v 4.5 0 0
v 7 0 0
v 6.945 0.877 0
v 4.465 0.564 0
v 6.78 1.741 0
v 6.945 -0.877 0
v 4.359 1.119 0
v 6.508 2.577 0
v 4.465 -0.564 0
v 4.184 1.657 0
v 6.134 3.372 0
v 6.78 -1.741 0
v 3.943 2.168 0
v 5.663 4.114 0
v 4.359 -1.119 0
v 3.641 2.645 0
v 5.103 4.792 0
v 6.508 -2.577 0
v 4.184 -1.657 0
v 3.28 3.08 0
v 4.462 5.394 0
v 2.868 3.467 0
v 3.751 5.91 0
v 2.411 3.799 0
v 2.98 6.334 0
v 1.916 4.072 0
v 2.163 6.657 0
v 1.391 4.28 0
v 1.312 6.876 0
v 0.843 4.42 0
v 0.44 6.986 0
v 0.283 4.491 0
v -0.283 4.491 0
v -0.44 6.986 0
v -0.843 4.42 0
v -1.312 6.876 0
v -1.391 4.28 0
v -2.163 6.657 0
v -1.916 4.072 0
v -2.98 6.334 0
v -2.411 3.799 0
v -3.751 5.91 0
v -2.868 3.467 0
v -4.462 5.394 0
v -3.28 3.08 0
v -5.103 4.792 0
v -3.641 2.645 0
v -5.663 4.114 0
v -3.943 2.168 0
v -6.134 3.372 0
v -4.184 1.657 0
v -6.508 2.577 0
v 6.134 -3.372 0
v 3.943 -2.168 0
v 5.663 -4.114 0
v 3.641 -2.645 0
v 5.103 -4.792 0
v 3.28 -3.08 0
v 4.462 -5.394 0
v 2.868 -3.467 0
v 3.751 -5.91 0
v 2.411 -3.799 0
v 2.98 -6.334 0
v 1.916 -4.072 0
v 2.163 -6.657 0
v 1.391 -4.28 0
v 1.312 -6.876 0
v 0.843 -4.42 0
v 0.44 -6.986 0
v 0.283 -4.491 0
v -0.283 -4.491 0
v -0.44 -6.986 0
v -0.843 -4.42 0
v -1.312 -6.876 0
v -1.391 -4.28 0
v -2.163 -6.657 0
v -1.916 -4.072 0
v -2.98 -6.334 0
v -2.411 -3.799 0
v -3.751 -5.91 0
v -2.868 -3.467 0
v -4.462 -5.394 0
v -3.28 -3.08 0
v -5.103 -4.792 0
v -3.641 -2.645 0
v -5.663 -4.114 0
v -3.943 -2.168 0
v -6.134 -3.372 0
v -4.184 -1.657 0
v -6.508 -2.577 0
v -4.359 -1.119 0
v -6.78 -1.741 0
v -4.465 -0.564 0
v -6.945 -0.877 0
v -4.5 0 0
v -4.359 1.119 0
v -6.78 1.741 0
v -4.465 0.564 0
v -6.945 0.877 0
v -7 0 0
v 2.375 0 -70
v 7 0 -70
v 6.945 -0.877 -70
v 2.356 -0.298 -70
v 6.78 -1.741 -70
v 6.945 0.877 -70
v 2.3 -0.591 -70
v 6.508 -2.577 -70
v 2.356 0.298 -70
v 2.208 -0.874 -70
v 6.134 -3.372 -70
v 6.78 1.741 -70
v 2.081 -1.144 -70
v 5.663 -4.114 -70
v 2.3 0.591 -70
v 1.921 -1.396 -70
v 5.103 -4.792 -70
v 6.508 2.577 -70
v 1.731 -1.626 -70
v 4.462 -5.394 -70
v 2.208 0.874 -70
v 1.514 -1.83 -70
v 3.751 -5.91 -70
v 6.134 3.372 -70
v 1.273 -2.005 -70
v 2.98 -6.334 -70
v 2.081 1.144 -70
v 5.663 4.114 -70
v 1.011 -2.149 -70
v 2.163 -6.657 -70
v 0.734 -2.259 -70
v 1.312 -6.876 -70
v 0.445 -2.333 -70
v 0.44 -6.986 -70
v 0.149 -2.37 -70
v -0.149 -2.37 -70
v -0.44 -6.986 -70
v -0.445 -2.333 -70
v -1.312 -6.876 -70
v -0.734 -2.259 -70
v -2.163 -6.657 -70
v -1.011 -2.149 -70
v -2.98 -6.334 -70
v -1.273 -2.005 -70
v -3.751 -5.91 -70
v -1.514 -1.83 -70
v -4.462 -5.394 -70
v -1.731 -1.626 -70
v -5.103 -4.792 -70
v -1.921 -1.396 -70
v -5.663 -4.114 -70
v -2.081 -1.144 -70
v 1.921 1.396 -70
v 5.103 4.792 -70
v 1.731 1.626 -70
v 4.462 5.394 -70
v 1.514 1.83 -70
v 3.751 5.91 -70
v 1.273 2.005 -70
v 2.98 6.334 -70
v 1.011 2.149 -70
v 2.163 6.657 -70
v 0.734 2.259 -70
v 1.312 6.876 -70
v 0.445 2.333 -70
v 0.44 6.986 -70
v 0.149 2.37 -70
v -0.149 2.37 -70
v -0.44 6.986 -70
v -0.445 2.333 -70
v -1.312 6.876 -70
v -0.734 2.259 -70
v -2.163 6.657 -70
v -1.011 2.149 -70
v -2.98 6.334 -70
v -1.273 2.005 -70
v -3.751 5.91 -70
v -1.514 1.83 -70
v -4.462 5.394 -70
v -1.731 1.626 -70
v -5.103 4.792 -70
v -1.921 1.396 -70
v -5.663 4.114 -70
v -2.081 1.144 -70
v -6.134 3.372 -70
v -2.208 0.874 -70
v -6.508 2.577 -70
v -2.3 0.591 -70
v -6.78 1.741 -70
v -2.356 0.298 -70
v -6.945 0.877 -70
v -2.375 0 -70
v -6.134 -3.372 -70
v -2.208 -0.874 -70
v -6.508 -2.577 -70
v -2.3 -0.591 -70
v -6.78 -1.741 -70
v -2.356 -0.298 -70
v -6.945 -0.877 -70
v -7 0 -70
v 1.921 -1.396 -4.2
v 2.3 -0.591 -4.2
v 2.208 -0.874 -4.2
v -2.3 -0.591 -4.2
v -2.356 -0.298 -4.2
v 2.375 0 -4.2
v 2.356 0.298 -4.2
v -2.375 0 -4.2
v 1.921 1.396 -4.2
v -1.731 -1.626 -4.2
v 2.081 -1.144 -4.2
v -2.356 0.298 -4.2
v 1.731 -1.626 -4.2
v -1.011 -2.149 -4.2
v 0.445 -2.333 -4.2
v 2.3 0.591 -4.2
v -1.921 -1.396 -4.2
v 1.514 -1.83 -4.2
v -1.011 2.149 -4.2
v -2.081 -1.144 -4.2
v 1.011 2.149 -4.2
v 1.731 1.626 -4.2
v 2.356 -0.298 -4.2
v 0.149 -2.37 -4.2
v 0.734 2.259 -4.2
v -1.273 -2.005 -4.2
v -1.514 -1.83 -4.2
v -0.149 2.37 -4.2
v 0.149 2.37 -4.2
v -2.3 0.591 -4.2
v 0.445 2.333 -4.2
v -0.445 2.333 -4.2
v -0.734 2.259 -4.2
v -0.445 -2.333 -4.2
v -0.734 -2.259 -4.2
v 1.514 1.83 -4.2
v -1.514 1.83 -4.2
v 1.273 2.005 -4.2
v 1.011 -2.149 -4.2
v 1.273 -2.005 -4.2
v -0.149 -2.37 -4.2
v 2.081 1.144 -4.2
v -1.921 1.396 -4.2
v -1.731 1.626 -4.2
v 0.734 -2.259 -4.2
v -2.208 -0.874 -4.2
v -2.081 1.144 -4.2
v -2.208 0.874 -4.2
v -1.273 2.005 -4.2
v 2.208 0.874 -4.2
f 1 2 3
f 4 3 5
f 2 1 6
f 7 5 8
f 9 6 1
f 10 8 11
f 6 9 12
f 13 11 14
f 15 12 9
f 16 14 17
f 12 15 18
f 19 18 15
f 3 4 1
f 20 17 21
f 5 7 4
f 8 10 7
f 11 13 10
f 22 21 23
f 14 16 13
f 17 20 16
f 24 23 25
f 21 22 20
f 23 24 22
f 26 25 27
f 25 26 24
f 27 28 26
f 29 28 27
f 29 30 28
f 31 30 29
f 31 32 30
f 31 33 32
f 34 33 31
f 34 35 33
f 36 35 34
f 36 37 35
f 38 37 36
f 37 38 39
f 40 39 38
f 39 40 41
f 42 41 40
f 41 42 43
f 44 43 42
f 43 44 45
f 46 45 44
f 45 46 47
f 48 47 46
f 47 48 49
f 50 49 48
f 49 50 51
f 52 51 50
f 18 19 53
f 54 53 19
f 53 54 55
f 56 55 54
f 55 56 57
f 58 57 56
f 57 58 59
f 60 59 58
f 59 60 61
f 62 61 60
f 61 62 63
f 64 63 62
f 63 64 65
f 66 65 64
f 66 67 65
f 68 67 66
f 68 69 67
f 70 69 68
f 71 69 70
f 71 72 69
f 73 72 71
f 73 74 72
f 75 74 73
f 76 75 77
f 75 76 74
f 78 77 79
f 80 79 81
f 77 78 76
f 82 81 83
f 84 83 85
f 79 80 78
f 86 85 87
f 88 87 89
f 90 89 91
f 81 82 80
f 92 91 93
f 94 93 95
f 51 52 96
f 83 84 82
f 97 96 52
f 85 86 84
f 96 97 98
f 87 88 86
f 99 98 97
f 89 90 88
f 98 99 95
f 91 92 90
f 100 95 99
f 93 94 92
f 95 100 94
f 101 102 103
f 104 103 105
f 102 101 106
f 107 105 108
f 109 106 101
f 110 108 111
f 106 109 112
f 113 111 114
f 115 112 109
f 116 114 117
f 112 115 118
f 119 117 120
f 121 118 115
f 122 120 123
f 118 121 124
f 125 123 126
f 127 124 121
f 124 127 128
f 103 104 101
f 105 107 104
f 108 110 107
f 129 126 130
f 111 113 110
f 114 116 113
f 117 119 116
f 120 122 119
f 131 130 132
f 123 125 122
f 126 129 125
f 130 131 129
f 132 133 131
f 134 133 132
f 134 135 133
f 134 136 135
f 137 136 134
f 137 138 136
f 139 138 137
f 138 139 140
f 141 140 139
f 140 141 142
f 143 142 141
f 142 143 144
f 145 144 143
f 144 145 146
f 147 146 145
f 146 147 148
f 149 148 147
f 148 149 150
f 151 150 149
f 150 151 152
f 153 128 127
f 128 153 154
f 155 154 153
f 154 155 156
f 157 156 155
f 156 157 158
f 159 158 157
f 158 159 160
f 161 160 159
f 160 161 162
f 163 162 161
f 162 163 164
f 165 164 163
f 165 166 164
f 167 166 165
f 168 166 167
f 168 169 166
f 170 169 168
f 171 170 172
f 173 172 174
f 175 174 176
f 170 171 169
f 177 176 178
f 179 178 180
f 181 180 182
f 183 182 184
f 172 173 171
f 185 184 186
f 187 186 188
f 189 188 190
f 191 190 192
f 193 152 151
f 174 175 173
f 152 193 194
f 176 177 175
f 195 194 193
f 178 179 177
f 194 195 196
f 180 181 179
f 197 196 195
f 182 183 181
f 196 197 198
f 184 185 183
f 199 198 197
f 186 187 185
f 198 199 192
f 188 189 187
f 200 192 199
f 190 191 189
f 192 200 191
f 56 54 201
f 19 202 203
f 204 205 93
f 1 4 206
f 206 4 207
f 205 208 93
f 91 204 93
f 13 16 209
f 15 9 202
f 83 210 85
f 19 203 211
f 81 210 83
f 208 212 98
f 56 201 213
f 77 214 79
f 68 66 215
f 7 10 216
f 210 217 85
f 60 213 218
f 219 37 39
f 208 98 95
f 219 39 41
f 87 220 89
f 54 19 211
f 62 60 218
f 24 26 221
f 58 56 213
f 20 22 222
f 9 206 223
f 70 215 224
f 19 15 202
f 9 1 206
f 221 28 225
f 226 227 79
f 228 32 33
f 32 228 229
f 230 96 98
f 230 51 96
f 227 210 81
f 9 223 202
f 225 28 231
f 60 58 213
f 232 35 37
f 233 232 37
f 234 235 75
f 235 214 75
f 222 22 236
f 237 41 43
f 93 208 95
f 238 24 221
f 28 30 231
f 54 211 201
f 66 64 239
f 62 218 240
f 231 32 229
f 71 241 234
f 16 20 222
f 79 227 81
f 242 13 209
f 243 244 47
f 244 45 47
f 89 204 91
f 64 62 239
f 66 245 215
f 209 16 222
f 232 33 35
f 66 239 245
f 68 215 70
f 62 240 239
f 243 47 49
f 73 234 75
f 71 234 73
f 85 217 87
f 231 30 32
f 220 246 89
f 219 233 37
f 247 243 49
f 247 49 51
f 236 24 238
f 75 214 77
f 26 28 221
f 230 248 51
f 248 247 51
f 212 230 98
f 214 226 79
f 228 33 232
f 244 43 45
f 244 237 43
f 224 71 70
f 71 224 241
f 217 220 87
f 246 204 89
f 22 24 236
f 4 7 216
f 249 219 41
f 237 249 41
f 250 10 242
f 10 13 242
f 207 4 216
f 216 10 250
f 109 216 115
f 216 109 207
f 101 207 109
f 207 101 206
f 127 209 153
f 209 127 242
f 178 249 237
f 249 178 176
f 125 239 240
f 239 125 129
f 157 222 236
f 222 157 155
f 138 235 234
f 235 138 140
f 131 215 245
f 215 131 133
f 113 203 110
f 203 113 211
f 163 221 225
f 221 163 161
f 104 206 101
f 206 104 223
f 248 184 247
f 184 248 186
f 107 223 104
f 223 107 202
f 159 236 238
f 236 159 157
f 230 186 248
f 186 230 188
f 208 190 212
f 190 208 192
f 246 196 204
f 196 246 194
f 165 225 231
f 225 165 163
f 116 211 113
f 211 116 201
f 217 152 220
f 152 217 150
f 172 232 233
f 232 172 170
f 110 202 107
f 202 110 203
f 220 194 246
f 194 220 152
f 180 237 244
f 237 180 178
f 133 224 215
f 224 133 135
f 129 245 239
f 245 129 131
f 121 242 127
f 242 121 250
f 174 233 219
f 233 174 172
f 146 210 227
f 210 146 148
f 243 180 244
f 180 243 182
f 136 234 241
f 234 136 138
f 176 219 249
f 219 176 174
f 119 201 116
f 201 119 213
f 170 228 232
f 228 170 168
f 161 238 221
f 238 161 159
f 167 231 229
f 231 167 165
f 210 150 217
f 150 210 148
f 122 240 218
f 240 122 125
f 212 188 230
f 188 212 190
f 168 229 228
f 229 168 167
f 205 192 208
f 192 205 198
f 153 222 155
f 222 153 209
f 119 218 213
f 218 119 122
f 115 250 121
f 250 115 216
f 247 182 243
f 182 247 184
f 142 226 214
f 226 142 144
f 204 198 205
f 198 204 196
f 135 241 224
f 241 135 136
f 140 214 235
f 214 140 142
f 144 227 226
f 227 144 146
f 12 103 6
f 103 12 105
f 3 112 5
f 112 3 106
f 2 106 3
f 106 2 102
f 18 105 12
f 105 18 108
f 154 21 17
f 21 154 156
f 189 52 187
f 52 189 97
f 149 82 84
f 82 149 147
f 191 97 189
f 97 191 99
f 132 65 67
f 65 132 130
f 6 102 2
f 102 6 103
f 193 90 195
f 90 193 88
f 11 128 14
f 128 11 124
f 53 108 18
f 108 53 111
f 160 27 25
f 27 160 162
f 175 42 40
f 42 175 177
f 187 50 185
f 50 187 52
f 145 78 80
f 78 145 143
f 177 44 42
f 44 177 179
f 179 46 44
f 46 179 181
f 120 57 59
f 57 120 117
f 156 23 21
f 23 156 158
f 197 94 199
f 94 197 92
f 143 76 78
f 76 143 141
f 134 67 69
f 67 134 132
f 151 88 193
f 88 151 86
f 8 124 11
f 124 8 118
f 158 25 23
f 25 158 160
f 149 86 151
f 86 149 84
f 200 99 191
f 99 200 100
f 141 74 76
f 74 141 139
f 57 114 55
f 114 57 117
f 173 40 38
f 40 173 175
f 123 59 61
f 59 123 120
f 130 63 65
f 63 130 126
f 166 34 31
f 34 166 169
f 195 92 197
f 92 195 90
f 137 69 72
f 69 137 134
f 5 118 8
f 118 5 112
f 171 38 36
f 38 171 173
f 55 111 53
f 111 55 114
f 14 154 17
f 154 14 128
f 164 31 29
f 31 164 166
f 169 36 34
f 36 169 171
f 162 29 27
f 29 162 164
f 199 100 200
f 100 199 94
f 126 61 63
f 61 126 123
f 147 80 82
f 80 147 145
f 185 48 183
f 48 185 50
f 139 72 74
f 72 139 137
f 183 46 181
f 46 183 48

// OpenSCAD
$fn = 50;


difference() {
	union() {
		translate(v = [0, 0, -70.0000000000]) {
			cylinder(h = 70, r = 7.0000000000);
		}
		cylinder(h = 0, r = 10.0000000000);
	}
	union() {
		translate(v = [0, 0, 0]) {
			rotate(a = [0, 0, 0]) {
				difference() {
					union() {
						#translate(v = [0, 0, -70.0000000000]) {
							cylinder(h = 70, r = 2.2500000000);
						}
						#translate(v = [0, 0, -4.2000000000]) {
							cylinder(h = 4.2000000000, r1 = 2.3750000000, r2 = 4.5000000000);
						}
						#translate(v = [0, 0, -70.0000000000]) {
							cylinder(h = 70, r = 2.3750000000);
						}
						#translate(v = [0, 0, -70.0000000000]) {
							cylinder(h = 70, r = 2.2500000000);
						}
					}
					union();
				}
			}
		}
	}
}
